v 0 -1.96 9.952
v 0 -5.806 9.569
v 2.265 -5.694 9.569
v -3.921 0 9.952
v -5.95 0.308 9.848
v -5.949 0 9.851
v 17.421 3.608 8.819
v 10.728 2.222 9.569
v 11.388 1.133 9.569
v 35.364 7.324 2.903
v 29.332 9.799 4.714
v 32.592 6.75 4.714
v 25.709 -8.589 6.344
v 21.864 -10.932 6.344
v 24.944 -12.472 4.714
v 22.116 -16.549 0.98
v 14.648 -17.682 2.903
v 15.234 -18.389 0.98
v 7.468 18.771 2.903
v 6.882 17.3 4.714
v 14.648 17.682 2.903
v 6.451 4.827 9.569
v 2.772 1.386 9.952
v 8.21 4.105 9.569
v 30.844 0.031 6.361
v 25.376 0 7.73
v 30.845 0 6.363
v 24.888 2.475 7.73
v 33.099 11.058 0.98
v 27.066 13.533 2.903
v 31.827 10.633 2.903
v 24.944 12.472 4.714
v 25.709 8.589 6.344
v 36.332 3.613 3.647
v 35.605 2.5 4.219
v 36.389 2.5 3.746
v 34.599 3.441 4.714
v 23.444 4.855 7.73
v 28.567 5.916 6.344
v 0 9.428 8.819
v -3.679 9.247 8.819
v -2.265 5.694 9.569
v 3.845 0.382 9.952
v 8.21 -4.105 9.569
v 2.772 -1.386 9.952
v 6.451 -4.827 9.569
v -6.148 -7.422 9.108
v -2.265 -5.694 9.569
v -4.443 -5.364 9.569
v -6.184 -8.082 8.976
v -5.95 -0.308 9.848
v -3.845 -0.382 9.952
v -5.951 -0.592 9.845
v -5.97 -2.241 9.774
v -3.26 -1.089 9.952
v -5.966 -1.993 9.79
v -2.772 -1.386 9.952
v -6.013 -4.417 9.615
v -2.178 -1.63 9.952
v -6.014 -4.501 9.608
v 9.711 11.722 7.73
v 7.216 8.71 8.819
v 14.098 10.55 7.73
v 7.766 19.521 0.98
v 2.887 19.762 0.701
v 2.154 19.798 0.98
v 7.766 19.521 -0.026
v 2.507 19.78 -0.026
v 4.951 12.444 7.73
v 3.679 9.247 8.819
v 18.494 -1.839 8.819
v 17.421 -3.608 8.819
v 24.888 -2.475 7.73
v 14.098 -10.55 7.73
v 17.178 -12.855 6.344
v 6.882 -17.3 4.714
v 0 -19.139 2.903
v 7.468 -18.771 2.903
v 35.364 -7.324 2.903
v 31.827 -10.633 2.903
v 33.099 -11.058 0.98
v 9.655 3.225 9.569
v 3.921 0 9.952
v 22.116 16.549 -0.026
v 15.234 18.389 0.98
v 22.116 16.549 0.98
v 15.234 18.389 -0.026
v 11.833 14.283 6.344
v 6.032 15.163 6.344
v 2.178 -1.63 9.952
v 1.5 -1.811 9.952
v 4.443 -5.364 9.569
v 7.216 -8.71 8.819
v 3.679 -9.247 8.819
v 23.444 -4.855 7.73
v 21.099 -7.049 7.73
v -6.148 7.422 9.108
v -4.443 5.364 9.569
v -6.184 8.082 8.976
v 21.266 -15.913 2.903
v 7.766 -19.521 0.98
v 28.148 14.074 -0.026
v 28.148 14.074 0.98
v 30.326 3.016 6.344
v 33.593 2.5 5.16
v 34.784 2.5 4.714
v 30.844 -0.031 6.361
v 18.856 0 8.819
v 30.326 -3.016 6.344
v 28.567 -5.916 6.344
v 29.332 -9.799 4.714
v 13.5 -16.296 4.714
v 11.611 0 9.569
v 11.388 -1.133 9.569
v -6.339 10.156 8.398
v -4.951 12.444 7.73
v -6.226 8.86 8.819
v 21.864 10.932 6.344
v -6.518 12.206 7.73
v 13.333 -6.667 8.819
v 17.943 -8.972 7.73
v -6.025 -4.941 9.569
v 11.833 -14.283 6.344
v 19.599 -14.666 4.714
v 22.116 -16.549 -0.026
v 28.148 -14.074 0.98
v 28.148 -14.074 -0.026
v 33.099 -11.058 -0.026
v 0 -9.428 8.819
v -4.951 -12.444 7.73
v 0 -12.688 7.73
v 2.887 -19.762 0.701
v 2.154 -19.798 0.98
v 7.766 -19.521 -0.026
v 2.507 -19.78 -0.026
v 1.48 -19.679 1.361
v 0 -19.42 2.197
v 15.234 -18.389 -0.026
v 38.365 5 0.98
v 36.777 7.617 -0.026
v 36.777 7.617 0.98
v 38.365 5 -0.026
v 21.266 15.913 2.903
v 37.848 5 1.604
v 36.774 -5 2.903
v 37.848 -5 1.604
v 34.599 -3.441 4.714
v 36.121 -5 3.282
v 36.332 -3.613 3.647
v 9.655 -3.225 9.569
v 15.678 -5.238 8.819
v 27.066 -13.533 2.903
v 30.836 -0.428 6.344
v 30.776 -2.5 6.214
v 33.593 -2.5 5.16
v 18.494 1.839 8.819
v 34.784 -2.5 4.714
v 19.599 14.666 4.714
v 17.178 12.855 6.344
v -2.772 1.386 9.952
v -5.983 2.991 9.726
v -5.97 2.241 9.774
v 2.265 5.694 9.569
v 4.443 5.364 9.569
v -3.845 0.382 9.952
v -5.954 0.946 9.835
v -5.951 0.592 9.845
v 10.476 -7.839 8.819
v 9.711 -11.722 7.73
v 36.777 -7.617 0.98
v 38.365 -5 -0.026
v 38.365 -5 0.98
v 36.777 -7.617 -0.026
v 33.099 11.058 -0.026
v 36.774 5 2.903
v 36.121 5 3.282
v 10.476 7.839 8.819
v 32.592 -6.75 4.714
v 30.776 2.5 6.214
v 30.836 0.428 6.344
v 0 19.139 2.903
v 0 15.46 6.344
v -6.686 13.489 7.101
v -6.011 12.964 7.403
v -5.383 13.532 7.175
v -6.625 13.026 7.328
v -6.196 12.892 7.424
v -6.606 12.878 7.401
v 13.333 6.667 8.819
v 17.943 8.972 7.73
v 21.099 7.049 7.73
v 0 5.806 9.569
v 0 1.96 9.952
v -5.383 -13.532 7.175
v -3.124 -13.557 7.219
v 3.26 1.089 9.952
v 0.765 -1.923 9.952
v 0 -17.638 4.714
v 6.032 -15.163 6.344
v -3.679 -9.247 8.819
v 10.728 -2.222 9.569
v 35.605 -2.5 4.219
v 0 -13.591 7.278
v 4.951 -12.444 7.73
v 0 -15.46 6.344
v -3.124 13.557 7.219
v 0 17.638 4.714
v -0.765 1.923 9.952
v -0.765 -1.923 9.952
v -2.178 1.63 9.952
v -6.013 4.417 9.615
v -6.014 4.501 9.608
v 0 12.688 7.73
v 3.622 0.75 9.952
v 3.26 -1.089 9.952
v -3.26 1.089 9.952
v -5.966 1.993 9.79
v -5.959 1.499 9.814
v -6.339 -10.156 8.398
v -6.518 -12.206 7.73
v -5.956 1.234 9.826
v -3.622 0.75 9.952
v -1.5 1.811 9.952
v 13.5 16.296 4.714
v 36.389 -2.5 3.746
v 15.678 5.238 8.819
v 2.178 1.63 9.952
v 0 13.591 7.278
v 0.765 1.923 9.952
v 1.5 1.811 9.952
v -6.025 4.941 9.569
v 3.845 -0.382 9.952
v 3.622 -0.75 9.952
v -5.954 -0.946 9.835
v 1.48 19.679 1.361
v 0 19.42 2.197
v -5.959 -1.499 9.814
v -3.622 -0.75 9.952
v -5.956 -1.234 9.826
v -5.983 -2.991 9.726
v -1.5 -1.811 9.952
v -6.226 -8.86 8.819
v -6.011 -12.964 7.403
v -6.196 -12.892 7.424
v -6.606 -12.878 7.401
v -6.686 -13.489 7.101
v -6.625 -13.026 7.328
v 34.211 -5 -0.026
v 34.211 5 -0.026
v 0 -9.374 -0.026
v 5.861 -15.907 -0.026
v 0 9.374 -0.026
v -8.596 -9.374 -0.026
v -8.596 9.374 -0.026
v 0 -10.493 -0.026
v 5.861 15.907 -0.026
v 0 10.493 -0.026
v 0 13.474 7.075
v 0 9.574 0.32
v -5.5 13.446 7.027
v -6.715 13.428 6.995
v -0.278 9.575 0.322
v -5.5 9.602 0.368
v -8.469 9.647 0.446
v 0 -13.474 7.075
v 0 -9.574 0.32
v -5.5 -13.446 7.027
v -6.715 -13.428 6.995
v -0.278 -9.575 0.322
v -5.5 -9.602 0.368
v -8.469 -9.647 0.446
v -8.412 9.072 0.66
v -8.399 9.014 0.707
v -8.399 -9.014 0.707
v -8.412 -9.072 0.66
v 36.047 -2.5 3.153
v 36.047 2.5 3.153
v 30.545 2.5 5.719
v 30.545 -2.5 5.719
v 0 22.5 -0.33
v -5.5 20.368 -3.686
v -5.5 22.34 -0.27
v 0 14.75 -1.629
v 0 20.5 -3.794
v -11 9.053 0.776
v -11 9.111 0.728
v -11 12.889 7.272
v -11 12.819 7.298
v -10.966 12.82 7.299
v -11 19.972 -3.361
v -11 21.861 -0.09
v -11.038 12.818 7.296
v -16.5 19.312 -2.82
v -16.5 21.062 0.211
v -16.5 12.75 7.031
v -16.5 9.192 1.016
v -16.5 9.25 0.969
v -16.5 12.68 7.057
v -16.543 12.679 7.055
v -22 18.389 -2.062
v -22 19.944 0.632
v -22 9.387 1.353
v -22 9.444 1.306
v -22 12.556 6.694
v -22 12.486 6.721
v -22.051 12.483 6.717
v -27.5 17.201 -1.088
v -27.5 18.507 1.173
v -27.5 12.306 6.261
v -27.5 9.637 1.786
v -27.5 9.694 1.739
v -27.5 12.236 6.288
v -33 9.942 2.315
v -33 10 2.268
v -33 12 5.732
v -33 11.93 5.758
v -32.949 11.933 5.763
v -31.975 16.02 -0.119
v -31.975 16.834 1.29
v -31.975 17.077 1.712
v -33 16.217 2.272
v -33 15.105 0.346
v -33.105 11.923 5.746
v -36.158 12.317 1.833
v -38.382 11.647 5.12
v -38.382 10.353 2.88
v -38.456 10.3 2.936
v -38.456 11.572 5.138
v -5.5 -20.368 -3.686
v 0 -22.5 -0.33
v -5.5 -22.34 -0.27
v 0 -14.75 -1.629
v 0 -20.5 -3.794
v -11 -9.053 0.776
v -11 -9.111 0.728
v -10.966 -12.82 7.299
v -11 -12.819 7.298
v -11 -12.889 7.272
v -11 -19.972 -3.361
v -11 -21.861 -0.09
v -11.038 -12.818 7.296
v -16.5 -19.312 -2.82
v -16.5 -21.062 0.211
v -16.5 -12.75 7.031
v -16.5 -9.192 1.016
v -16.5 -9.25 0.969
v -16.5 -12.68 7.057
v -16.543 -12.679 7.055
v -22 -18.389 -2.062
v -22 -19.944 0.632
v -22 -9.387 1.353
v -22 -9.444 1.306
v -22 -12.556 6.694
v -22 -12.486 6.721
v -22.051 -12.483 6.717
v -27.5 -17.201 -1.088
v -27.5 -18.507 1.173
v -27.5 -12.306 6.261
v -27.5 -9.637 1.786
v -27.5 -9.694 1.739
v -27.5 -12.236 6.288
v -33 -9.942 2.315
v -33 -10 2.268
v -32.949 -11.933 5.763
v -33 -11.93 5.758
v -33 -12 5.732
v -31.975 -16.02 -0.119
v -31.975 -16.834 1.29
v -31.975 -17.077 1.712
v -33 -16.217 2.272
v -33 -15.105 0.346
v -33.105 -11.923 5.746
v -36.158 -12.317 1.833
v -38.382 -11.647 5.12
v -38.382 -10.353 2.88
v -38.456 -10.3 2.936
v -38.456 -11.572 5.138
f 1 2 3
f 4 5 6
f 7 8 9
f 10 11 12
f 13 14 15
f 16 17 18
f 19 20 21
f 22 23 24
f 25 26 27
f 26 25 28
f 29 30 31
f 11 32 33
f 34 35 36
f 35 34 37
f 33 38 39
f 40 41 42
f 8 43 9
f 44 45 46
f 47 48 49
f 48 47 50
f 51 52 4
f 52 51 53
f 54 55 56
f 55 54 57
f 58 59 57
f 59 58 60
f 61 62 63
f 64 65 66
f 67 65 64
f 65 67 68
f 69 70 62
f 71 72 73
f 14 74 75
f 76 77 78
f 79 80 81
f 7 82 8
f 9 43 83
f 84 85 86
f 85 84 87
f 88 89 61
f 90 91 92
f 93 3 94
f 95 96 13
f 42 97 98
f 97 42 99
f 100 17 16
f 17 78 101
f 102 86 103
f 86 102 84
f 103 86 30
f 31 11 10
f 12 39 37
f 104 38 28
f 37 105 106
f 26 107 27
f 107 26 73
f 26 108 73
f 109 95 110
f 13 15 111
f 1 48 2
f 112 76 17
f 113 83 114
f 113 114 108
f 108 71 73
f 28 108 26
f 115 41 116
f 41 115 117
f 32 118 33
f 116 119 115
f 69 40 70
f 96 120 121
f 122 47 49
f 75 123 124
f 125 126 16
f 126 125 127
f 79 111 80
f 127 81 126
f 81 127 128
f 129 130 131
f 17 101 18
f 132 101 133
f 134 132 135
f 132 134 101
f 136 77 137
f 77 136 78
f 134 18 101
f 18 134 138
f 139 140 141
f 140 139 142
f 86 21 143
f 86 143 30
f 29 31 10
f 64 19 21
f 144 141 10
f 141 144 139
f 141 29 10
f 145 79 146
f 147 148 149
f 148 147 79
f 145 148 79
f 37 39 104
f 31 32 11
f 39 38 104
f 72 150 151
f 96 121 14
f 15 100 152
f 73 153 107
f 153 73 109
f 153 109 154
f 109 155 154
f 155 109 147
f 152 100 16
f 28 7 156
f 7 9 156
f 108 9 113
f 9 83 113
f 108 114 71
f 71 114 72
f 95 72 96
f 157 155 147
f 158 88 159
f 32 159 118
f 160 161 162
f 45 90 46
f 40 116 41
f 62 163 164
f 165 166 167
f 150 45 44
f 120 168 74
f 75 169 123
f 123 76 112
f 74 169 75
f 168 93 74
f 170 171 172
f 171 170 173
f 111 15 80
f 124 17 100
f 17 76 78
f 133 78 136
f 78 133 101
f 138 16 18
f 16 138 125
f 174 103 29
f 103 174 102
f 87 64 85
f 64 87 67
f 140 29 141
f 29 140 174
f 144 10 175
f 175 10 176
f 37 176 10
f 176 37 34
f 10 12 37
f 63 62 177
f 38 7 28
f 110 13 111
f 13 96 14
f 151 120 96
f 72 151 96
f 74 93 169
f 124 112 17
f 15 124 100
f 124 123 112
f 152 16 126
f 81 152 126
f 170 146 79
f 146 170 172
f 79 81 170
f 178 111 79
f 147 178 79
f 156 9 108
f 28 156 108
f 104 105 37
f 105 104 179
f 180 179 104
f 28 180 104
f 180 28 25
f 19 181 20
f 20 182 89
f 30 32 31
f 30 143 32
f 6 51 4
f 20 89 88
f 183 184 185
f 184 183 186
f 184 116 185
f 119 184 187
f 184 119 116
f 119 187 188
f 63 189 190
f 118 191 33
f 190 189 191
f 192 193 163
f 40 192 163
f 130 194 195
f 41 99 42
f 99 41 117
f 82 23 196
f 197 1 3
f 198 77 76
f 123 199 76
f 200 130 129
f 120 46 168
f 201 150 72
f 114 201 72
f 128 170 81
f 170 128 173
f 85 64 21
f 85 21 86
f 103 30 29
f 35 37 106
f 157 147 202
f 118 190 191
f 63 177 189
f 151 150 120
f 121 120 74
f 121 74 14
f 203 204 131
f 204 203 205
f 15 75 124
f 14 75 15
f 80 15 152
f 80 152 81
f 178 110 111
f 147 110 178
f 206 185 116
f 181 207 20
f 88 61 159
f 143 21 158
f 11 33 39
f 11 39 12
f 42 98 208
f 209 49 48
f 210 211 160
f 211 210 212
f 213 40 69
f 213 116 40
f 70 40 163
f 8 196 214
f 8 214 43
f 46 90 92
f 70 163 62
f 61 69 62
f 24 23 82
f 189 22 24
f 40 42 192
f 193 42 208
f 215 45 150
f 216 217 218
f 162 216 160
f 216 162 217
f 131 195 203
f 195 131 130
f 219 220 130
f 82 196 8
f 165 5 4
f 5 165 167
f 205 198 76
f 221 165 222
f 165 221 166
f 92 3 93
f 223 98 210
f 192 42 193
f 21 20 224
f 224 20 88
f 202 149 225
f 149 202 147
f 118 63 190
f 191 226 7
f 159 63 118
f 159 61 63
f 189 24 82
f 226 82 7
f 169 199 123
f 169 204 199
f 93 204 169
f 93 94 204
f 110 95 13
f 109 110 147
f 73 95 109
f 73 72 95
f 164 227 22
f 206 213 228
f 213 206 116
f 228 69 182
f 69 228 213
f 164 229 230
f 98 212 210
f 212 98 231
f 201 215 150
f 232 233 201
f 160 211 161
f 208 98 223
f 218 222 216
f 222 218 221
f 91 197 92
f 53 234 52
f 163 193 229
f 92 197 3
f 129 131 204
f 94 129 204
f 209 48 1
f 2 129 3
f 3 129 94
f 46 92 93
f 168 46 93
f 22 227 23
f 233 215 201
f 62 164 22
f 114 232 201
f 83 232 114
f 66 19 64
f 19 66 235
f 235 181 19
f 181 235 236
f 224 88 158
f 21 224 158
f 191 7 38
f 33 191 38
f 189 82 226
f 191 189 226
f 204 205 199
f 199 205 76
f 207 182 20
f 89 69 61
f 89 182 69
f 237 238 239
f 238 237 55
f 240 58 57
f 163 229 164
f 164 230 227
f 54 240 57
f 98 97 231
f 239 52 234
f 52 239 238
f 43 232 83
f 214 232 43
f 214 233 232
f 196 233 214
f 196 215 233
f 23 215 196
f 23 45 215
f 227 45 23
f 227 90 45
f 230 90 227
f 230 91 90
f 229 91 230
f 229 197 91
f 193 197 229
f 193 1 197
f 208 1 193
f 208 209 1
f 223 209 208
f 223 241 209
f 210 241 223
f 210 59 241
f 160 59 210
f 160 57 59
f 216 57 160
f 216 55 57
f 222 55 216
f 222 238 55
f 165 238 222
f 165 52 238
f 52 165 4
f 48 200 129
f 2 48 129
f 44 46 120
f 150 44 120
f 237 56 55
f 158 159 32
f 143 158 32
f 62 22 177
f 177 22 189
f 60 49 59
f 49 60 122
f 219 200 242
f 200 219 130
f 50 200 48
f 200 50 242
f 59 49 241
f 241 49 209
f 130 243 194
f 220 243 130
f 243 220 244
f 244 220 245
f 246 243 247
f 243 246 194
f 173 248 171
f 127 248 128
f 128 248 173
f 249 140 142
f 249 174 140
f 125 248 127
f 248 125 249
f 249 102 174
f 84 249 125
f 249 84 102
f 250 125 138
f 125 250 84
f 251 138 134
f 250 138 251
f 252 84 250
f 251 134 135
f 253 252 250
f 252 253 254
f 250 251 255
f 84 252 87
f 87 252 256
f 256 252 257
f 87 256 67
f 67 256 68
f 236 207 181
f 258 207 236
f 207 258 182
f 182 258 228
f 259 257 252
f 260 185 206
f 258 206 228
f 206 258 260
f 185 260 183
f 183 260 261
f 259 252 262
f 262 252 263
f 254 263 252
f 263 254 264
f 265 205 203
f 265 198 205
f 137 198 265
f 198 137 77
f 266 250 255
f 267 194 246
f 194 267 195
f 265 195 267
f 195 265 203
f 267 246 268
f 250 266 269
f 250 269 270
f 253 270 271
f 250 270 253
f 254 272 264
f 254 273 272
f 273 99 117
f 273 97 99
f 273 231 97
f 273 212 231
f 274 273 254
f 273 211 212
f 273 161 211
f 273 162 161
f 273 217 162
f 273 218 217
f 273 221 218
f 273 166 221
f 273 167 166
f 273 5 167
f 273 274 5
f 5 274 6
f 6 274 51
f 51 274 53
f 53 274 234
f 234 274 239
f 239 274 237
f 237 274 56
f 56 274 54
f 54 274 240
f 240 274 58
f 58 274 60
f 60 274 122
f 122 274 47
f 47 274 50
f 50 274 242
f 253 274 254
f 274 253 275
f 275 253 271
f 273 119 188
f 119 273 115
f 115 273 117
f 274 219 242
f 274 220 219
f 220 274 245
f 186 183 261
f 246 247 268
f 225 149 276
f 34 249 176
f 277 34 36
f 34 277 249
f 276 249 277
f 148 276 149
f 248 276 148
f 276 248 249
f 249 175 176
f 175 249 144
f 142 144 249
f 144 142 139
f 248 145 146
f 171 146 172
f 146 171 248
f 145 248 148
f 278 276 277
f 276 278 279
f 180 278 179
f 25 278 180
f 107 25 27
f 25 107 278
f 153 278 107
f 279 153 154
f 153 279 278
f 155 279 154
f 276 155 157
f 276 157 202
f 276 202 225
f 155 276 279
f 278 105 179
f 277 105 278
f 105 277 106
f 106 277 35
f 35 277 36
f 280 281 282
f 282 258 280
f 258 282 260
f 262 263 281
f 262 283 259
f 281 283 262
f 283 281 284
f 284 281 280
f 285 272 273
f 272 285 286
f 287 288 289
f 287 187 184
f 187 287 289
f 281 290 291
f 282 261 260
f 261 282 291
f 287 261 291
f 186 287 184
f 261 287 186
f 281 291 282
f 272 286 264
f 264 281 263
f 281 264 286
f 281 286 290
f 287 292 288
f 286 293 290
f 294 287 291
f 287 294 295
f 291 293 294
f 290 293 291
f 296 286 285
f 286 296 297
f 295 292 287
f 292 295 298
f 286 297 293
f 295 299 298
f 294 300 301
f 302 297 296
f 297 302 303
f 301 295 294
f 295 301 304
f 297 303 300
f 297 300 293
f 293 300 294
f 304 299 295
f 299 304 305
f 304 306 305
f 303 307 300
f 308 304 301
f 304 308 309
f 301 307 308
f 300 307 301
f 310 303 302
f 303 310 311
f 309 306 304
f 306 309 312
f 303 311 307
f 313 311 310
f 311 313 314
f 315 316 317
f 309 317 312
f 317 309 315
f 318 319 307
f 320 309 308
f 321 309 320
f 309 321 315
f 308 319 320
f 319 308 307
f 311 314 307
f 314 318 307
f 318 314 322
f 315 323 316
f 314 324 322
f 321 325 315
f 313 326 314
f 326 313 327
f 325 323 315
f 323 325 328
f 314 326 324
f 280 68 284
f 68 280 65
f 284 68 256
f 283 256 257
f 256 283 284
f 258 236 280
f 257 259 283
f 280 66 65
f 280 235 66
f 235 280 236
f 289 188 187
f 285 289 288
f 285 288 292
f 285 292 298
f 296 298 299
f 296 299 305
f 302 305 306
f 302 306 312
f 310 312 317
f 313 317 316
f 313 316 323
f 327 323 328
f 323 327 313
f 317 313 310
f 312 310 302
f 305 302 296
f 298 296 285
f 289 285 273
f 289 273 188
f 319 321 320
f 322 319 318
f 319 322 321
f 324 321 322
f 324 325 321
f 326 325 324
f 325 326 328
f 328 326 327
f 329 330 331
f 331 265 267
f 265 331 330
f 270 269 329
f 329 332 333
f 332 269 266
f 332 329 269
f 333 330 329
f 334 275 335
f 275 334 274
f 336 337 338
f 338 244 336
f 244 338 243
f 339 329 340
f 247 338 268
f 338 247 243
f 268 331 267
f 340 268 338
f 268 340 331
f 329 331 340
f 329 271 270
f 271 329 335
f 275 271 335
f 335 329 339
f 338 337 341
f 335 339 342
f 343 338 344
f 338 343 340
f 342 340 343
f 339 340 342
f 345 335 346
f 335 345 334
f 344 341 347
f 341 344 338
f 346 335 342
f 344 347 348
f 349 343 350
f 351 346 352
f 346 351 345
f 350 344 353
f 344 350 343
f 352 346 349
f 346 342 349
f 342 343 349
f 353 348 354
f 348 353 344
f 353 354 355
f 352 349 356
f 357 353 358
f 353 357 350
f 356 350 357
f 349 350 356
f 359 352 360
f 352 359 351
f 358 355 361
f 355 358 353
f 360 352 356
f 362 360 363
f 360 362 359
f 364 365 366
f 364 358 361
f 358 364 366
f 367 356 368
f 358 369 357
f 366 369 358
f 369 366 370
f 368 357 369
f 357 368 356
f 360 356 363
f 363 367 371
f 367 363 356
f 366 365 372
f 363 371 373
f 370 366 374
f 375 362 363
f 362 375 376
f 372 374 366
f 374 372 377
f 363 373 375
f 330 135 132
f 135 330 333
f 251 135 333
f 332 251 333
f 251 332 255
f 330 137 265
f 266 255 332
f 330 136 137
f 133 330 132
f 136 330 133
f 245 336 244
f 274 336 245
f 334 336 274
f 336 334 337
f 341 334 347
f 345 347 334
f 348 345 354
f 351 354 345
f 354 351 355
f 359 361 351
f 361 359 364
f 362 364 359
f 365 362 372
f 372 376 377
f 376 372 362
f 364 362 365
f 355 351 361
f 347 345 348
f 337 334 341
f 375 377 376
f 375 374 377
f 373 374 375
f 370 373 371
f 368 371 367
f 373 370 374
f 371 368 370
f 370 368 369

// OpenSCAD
// file: util.scad
fn1 = 32;
fn2 = 16;

module util_half_sphere(radius, fn=fn1) {
    difference() {
        sphere(radius, $fn=fn);
        translate([0,0,-(radius+radius/19)])
            cube(2*radius+radius/10, center=true);
    }
}

function gcd(a,b) = a == b ? a : a > b ? gcd(a-b, b) : gcd(a, b-a);

module util_saucer(length, width, height, fn=fn1) {
    rad = gcd(length,gcd(width,height));
    //rad = 10;
    scale([length/(2*rad), width/(2*rad), height/rad])
        util_half_sphere(rad, fn);
}

module util_half_cylinder(length, radius, inner_fn=fn2, outer_fn=fn1) {
    maxval = max(length, 2*radius);
    intersection() {
        difference() {
            rotate([0,90,0])
                translate([0,0,-(length/2 + length/20)])
                    cylinder(length+length/10, radius, radius, $fn=inner_fn);
            
            translate([0,0,(maxval/2 + maxval/19)])
                cube(maxval+maxval/10, center=true);
        }
        
        translate([0,0,-(radius+radius/20)])
            cylinder(radius + radius/10, length/2, length/2, $fn=outer_fn);
    }
}

module util_body(length, width, height, upper_height, fn=fn1) {
    rad = gcd(length, gcd(width, upper_height));
    
    scale(.995) scale([length/(2*rad), width/(2*rad), 1])
        util_half_cylinder(2*rad, height, outer_fn=fn);
}

module util_graded_cylinder(height, radius_start, radius_end, grades=1, fn=fn1) {
    height_grade = height / grades;
    radius_grade = (radius_start - radius_end) / (grades * grades);
    for (i = [0 : 1 : grades]) {
        translate([0,0,i*height_grade])
            cylinder(height_grade, 
                     radius_start - i*radius_grade * i,
                     radius_start - (i+1) * radius_grade * (i+1),
                     $fn = fn);
    }
}

module util_nacelle(length, width, height, curved=false, up=true, front_bulge=false) {
    rad = min(width, height/2);
    grads = curved ? 6 : 1;
    scale_factor = front_bulge ? 1.1 : 1;
    direction = up ? -1 : 1;
    difference() {
        scale([1, width/ (2*rad), height/rad])
            difference() {
                union() {
                    rotate([0,-90,0])
                        rotate(30)
                            util_graded_cylinder(length-rad, rad, rad/2, grads, 6);
                    scale(scale_factor) 
                        rotate([0,90,0]) rotate(90) sphere(rad, $fn=6);
                }
                
                translate([-length/2, 0, direction * (height/2 + height/19)])
                    cube([length+length, width+width, height+height/10], center=true);
            }
        
        translate([-length-(curved?length/3:0), 0, -length/3])
            rotate([0,-45,0])
                cube(length, center=true);
    }
}

module util_mirrored(v) {
    children();
    mirror(v) children();
}

module util_ring(outer, inner, height) {
    difference() {
        translate([0,0,-height/2])
            cylinder(height, outer, outer);
        translate([0,0,-(height/2 + height/19)])
            cylinder(height+height/10, inner, inner);
    }
}

module util_star(radius, thick, num, half=false) {
    angle = 360/num;
    offset = half? angle/2 : 0;
    for (i = [0: 1: num]) {
        rotate(i* angle + offset)
            translate([radius/2,0,0])
                cube([radius, thick, thick], center=true);
    }
}

module util_ring_star(radius, thick, num, inner, half=false) {
    outer=inner+thick;
    avg = (inner + outer)/2;
    union() {
        difference() {
            util_star(radius, thick, num, half);
            cylinder(2*thick, outer, outer, $fn=num, center=true);
        }
        util_ring(outer, inner, thick);
    }
}

module util_hangar_disk(height, lower, upper, num, fn=fn1) {
    difference() {
            cylinder(height, lower, upper, $fn=fn, center=true);
        difference() {
            scale([1,1,22])
                util_star(1.1*upper, height/20, num, half=true);
            scale(.95)
                cylinder(height, lower, upper, $fn=fn, center=true);
        }
    }
}

module util_hangar_form(length, width, height, num, inner=0) {
    l = 0.6* max(length, width);
    h = 2.5* height;
    thick = min(height/20,1);
    inner = inner == 0 ? l/3 : inner;
    difference() {
        children();
        scale([1,1,h/thick]) 
            util_ring_star(l, thick, num, inner, half=true);
    }
    scale(.95) children();
}

module util_nacelle_bar(span, height, width, thickness) {
    rad = (span*span/(8*height) + height/2);
    outer = rad + thickness/2;
    inner = rad - thickness/2;
    difference(){
        translate([0,0,outer])
            rotate([0,90,0])
                util_ring(outer, inner, width);
    
        translate([0,0,1.1*outer+height])
            cube(2.2*outer, center=true);
    }
}
// main file
use <util.scad>;

module model1() {
    cylinder(2,20,15);
    mirror([0,0,1])
        cylinder(2,20,19);

    difference() {
        translate([-20,0,0])
            mirror([0,0,1])
                util_saucer(80,20,6);
        
        translate([-65,0,0])
            cube(100,center=true);
        
        translate([68,0,0])
            cube(100,center=true);
    }

    translate([-15,0,0]) {
        mirror([0,0,1])
            util_saucer(20,20,6);


        util_saucer(20,20,2);
    }

    translate([5,0,0])
        util_nacelle(25,20,3,curved=true);

    util_mirrored([0,1,0])
        translate([-15,10,-5])
            rotate([60,0,0])
                util_nacelle(35,5,12,curved=true,up=false);
}


module model2() {
    difference() {
        util_saucer(80,40,10);

        translate([-50,0,0])
            rotate([0,15,0])
                cube(80,center=true);

        util_mirrored([0,1,0])
            translate([-40,55,-1])
                rotate([-30,0,0])
                    cube(80,center=true);
            
        translate([40,0,0])
            rotate([0,30,0])
                cube(10,center=true);

        translate([35,0,6.4])
            rotate([0,-65,0])
                cube([5,5,7.5],center=true);

    }


    util_mirrored([0,1,0]) 
        translate([-0,11,4])
            rotate([60,0,0])
                util_nacelle(40,8,14,curved=true,up=false);

}

model2();
